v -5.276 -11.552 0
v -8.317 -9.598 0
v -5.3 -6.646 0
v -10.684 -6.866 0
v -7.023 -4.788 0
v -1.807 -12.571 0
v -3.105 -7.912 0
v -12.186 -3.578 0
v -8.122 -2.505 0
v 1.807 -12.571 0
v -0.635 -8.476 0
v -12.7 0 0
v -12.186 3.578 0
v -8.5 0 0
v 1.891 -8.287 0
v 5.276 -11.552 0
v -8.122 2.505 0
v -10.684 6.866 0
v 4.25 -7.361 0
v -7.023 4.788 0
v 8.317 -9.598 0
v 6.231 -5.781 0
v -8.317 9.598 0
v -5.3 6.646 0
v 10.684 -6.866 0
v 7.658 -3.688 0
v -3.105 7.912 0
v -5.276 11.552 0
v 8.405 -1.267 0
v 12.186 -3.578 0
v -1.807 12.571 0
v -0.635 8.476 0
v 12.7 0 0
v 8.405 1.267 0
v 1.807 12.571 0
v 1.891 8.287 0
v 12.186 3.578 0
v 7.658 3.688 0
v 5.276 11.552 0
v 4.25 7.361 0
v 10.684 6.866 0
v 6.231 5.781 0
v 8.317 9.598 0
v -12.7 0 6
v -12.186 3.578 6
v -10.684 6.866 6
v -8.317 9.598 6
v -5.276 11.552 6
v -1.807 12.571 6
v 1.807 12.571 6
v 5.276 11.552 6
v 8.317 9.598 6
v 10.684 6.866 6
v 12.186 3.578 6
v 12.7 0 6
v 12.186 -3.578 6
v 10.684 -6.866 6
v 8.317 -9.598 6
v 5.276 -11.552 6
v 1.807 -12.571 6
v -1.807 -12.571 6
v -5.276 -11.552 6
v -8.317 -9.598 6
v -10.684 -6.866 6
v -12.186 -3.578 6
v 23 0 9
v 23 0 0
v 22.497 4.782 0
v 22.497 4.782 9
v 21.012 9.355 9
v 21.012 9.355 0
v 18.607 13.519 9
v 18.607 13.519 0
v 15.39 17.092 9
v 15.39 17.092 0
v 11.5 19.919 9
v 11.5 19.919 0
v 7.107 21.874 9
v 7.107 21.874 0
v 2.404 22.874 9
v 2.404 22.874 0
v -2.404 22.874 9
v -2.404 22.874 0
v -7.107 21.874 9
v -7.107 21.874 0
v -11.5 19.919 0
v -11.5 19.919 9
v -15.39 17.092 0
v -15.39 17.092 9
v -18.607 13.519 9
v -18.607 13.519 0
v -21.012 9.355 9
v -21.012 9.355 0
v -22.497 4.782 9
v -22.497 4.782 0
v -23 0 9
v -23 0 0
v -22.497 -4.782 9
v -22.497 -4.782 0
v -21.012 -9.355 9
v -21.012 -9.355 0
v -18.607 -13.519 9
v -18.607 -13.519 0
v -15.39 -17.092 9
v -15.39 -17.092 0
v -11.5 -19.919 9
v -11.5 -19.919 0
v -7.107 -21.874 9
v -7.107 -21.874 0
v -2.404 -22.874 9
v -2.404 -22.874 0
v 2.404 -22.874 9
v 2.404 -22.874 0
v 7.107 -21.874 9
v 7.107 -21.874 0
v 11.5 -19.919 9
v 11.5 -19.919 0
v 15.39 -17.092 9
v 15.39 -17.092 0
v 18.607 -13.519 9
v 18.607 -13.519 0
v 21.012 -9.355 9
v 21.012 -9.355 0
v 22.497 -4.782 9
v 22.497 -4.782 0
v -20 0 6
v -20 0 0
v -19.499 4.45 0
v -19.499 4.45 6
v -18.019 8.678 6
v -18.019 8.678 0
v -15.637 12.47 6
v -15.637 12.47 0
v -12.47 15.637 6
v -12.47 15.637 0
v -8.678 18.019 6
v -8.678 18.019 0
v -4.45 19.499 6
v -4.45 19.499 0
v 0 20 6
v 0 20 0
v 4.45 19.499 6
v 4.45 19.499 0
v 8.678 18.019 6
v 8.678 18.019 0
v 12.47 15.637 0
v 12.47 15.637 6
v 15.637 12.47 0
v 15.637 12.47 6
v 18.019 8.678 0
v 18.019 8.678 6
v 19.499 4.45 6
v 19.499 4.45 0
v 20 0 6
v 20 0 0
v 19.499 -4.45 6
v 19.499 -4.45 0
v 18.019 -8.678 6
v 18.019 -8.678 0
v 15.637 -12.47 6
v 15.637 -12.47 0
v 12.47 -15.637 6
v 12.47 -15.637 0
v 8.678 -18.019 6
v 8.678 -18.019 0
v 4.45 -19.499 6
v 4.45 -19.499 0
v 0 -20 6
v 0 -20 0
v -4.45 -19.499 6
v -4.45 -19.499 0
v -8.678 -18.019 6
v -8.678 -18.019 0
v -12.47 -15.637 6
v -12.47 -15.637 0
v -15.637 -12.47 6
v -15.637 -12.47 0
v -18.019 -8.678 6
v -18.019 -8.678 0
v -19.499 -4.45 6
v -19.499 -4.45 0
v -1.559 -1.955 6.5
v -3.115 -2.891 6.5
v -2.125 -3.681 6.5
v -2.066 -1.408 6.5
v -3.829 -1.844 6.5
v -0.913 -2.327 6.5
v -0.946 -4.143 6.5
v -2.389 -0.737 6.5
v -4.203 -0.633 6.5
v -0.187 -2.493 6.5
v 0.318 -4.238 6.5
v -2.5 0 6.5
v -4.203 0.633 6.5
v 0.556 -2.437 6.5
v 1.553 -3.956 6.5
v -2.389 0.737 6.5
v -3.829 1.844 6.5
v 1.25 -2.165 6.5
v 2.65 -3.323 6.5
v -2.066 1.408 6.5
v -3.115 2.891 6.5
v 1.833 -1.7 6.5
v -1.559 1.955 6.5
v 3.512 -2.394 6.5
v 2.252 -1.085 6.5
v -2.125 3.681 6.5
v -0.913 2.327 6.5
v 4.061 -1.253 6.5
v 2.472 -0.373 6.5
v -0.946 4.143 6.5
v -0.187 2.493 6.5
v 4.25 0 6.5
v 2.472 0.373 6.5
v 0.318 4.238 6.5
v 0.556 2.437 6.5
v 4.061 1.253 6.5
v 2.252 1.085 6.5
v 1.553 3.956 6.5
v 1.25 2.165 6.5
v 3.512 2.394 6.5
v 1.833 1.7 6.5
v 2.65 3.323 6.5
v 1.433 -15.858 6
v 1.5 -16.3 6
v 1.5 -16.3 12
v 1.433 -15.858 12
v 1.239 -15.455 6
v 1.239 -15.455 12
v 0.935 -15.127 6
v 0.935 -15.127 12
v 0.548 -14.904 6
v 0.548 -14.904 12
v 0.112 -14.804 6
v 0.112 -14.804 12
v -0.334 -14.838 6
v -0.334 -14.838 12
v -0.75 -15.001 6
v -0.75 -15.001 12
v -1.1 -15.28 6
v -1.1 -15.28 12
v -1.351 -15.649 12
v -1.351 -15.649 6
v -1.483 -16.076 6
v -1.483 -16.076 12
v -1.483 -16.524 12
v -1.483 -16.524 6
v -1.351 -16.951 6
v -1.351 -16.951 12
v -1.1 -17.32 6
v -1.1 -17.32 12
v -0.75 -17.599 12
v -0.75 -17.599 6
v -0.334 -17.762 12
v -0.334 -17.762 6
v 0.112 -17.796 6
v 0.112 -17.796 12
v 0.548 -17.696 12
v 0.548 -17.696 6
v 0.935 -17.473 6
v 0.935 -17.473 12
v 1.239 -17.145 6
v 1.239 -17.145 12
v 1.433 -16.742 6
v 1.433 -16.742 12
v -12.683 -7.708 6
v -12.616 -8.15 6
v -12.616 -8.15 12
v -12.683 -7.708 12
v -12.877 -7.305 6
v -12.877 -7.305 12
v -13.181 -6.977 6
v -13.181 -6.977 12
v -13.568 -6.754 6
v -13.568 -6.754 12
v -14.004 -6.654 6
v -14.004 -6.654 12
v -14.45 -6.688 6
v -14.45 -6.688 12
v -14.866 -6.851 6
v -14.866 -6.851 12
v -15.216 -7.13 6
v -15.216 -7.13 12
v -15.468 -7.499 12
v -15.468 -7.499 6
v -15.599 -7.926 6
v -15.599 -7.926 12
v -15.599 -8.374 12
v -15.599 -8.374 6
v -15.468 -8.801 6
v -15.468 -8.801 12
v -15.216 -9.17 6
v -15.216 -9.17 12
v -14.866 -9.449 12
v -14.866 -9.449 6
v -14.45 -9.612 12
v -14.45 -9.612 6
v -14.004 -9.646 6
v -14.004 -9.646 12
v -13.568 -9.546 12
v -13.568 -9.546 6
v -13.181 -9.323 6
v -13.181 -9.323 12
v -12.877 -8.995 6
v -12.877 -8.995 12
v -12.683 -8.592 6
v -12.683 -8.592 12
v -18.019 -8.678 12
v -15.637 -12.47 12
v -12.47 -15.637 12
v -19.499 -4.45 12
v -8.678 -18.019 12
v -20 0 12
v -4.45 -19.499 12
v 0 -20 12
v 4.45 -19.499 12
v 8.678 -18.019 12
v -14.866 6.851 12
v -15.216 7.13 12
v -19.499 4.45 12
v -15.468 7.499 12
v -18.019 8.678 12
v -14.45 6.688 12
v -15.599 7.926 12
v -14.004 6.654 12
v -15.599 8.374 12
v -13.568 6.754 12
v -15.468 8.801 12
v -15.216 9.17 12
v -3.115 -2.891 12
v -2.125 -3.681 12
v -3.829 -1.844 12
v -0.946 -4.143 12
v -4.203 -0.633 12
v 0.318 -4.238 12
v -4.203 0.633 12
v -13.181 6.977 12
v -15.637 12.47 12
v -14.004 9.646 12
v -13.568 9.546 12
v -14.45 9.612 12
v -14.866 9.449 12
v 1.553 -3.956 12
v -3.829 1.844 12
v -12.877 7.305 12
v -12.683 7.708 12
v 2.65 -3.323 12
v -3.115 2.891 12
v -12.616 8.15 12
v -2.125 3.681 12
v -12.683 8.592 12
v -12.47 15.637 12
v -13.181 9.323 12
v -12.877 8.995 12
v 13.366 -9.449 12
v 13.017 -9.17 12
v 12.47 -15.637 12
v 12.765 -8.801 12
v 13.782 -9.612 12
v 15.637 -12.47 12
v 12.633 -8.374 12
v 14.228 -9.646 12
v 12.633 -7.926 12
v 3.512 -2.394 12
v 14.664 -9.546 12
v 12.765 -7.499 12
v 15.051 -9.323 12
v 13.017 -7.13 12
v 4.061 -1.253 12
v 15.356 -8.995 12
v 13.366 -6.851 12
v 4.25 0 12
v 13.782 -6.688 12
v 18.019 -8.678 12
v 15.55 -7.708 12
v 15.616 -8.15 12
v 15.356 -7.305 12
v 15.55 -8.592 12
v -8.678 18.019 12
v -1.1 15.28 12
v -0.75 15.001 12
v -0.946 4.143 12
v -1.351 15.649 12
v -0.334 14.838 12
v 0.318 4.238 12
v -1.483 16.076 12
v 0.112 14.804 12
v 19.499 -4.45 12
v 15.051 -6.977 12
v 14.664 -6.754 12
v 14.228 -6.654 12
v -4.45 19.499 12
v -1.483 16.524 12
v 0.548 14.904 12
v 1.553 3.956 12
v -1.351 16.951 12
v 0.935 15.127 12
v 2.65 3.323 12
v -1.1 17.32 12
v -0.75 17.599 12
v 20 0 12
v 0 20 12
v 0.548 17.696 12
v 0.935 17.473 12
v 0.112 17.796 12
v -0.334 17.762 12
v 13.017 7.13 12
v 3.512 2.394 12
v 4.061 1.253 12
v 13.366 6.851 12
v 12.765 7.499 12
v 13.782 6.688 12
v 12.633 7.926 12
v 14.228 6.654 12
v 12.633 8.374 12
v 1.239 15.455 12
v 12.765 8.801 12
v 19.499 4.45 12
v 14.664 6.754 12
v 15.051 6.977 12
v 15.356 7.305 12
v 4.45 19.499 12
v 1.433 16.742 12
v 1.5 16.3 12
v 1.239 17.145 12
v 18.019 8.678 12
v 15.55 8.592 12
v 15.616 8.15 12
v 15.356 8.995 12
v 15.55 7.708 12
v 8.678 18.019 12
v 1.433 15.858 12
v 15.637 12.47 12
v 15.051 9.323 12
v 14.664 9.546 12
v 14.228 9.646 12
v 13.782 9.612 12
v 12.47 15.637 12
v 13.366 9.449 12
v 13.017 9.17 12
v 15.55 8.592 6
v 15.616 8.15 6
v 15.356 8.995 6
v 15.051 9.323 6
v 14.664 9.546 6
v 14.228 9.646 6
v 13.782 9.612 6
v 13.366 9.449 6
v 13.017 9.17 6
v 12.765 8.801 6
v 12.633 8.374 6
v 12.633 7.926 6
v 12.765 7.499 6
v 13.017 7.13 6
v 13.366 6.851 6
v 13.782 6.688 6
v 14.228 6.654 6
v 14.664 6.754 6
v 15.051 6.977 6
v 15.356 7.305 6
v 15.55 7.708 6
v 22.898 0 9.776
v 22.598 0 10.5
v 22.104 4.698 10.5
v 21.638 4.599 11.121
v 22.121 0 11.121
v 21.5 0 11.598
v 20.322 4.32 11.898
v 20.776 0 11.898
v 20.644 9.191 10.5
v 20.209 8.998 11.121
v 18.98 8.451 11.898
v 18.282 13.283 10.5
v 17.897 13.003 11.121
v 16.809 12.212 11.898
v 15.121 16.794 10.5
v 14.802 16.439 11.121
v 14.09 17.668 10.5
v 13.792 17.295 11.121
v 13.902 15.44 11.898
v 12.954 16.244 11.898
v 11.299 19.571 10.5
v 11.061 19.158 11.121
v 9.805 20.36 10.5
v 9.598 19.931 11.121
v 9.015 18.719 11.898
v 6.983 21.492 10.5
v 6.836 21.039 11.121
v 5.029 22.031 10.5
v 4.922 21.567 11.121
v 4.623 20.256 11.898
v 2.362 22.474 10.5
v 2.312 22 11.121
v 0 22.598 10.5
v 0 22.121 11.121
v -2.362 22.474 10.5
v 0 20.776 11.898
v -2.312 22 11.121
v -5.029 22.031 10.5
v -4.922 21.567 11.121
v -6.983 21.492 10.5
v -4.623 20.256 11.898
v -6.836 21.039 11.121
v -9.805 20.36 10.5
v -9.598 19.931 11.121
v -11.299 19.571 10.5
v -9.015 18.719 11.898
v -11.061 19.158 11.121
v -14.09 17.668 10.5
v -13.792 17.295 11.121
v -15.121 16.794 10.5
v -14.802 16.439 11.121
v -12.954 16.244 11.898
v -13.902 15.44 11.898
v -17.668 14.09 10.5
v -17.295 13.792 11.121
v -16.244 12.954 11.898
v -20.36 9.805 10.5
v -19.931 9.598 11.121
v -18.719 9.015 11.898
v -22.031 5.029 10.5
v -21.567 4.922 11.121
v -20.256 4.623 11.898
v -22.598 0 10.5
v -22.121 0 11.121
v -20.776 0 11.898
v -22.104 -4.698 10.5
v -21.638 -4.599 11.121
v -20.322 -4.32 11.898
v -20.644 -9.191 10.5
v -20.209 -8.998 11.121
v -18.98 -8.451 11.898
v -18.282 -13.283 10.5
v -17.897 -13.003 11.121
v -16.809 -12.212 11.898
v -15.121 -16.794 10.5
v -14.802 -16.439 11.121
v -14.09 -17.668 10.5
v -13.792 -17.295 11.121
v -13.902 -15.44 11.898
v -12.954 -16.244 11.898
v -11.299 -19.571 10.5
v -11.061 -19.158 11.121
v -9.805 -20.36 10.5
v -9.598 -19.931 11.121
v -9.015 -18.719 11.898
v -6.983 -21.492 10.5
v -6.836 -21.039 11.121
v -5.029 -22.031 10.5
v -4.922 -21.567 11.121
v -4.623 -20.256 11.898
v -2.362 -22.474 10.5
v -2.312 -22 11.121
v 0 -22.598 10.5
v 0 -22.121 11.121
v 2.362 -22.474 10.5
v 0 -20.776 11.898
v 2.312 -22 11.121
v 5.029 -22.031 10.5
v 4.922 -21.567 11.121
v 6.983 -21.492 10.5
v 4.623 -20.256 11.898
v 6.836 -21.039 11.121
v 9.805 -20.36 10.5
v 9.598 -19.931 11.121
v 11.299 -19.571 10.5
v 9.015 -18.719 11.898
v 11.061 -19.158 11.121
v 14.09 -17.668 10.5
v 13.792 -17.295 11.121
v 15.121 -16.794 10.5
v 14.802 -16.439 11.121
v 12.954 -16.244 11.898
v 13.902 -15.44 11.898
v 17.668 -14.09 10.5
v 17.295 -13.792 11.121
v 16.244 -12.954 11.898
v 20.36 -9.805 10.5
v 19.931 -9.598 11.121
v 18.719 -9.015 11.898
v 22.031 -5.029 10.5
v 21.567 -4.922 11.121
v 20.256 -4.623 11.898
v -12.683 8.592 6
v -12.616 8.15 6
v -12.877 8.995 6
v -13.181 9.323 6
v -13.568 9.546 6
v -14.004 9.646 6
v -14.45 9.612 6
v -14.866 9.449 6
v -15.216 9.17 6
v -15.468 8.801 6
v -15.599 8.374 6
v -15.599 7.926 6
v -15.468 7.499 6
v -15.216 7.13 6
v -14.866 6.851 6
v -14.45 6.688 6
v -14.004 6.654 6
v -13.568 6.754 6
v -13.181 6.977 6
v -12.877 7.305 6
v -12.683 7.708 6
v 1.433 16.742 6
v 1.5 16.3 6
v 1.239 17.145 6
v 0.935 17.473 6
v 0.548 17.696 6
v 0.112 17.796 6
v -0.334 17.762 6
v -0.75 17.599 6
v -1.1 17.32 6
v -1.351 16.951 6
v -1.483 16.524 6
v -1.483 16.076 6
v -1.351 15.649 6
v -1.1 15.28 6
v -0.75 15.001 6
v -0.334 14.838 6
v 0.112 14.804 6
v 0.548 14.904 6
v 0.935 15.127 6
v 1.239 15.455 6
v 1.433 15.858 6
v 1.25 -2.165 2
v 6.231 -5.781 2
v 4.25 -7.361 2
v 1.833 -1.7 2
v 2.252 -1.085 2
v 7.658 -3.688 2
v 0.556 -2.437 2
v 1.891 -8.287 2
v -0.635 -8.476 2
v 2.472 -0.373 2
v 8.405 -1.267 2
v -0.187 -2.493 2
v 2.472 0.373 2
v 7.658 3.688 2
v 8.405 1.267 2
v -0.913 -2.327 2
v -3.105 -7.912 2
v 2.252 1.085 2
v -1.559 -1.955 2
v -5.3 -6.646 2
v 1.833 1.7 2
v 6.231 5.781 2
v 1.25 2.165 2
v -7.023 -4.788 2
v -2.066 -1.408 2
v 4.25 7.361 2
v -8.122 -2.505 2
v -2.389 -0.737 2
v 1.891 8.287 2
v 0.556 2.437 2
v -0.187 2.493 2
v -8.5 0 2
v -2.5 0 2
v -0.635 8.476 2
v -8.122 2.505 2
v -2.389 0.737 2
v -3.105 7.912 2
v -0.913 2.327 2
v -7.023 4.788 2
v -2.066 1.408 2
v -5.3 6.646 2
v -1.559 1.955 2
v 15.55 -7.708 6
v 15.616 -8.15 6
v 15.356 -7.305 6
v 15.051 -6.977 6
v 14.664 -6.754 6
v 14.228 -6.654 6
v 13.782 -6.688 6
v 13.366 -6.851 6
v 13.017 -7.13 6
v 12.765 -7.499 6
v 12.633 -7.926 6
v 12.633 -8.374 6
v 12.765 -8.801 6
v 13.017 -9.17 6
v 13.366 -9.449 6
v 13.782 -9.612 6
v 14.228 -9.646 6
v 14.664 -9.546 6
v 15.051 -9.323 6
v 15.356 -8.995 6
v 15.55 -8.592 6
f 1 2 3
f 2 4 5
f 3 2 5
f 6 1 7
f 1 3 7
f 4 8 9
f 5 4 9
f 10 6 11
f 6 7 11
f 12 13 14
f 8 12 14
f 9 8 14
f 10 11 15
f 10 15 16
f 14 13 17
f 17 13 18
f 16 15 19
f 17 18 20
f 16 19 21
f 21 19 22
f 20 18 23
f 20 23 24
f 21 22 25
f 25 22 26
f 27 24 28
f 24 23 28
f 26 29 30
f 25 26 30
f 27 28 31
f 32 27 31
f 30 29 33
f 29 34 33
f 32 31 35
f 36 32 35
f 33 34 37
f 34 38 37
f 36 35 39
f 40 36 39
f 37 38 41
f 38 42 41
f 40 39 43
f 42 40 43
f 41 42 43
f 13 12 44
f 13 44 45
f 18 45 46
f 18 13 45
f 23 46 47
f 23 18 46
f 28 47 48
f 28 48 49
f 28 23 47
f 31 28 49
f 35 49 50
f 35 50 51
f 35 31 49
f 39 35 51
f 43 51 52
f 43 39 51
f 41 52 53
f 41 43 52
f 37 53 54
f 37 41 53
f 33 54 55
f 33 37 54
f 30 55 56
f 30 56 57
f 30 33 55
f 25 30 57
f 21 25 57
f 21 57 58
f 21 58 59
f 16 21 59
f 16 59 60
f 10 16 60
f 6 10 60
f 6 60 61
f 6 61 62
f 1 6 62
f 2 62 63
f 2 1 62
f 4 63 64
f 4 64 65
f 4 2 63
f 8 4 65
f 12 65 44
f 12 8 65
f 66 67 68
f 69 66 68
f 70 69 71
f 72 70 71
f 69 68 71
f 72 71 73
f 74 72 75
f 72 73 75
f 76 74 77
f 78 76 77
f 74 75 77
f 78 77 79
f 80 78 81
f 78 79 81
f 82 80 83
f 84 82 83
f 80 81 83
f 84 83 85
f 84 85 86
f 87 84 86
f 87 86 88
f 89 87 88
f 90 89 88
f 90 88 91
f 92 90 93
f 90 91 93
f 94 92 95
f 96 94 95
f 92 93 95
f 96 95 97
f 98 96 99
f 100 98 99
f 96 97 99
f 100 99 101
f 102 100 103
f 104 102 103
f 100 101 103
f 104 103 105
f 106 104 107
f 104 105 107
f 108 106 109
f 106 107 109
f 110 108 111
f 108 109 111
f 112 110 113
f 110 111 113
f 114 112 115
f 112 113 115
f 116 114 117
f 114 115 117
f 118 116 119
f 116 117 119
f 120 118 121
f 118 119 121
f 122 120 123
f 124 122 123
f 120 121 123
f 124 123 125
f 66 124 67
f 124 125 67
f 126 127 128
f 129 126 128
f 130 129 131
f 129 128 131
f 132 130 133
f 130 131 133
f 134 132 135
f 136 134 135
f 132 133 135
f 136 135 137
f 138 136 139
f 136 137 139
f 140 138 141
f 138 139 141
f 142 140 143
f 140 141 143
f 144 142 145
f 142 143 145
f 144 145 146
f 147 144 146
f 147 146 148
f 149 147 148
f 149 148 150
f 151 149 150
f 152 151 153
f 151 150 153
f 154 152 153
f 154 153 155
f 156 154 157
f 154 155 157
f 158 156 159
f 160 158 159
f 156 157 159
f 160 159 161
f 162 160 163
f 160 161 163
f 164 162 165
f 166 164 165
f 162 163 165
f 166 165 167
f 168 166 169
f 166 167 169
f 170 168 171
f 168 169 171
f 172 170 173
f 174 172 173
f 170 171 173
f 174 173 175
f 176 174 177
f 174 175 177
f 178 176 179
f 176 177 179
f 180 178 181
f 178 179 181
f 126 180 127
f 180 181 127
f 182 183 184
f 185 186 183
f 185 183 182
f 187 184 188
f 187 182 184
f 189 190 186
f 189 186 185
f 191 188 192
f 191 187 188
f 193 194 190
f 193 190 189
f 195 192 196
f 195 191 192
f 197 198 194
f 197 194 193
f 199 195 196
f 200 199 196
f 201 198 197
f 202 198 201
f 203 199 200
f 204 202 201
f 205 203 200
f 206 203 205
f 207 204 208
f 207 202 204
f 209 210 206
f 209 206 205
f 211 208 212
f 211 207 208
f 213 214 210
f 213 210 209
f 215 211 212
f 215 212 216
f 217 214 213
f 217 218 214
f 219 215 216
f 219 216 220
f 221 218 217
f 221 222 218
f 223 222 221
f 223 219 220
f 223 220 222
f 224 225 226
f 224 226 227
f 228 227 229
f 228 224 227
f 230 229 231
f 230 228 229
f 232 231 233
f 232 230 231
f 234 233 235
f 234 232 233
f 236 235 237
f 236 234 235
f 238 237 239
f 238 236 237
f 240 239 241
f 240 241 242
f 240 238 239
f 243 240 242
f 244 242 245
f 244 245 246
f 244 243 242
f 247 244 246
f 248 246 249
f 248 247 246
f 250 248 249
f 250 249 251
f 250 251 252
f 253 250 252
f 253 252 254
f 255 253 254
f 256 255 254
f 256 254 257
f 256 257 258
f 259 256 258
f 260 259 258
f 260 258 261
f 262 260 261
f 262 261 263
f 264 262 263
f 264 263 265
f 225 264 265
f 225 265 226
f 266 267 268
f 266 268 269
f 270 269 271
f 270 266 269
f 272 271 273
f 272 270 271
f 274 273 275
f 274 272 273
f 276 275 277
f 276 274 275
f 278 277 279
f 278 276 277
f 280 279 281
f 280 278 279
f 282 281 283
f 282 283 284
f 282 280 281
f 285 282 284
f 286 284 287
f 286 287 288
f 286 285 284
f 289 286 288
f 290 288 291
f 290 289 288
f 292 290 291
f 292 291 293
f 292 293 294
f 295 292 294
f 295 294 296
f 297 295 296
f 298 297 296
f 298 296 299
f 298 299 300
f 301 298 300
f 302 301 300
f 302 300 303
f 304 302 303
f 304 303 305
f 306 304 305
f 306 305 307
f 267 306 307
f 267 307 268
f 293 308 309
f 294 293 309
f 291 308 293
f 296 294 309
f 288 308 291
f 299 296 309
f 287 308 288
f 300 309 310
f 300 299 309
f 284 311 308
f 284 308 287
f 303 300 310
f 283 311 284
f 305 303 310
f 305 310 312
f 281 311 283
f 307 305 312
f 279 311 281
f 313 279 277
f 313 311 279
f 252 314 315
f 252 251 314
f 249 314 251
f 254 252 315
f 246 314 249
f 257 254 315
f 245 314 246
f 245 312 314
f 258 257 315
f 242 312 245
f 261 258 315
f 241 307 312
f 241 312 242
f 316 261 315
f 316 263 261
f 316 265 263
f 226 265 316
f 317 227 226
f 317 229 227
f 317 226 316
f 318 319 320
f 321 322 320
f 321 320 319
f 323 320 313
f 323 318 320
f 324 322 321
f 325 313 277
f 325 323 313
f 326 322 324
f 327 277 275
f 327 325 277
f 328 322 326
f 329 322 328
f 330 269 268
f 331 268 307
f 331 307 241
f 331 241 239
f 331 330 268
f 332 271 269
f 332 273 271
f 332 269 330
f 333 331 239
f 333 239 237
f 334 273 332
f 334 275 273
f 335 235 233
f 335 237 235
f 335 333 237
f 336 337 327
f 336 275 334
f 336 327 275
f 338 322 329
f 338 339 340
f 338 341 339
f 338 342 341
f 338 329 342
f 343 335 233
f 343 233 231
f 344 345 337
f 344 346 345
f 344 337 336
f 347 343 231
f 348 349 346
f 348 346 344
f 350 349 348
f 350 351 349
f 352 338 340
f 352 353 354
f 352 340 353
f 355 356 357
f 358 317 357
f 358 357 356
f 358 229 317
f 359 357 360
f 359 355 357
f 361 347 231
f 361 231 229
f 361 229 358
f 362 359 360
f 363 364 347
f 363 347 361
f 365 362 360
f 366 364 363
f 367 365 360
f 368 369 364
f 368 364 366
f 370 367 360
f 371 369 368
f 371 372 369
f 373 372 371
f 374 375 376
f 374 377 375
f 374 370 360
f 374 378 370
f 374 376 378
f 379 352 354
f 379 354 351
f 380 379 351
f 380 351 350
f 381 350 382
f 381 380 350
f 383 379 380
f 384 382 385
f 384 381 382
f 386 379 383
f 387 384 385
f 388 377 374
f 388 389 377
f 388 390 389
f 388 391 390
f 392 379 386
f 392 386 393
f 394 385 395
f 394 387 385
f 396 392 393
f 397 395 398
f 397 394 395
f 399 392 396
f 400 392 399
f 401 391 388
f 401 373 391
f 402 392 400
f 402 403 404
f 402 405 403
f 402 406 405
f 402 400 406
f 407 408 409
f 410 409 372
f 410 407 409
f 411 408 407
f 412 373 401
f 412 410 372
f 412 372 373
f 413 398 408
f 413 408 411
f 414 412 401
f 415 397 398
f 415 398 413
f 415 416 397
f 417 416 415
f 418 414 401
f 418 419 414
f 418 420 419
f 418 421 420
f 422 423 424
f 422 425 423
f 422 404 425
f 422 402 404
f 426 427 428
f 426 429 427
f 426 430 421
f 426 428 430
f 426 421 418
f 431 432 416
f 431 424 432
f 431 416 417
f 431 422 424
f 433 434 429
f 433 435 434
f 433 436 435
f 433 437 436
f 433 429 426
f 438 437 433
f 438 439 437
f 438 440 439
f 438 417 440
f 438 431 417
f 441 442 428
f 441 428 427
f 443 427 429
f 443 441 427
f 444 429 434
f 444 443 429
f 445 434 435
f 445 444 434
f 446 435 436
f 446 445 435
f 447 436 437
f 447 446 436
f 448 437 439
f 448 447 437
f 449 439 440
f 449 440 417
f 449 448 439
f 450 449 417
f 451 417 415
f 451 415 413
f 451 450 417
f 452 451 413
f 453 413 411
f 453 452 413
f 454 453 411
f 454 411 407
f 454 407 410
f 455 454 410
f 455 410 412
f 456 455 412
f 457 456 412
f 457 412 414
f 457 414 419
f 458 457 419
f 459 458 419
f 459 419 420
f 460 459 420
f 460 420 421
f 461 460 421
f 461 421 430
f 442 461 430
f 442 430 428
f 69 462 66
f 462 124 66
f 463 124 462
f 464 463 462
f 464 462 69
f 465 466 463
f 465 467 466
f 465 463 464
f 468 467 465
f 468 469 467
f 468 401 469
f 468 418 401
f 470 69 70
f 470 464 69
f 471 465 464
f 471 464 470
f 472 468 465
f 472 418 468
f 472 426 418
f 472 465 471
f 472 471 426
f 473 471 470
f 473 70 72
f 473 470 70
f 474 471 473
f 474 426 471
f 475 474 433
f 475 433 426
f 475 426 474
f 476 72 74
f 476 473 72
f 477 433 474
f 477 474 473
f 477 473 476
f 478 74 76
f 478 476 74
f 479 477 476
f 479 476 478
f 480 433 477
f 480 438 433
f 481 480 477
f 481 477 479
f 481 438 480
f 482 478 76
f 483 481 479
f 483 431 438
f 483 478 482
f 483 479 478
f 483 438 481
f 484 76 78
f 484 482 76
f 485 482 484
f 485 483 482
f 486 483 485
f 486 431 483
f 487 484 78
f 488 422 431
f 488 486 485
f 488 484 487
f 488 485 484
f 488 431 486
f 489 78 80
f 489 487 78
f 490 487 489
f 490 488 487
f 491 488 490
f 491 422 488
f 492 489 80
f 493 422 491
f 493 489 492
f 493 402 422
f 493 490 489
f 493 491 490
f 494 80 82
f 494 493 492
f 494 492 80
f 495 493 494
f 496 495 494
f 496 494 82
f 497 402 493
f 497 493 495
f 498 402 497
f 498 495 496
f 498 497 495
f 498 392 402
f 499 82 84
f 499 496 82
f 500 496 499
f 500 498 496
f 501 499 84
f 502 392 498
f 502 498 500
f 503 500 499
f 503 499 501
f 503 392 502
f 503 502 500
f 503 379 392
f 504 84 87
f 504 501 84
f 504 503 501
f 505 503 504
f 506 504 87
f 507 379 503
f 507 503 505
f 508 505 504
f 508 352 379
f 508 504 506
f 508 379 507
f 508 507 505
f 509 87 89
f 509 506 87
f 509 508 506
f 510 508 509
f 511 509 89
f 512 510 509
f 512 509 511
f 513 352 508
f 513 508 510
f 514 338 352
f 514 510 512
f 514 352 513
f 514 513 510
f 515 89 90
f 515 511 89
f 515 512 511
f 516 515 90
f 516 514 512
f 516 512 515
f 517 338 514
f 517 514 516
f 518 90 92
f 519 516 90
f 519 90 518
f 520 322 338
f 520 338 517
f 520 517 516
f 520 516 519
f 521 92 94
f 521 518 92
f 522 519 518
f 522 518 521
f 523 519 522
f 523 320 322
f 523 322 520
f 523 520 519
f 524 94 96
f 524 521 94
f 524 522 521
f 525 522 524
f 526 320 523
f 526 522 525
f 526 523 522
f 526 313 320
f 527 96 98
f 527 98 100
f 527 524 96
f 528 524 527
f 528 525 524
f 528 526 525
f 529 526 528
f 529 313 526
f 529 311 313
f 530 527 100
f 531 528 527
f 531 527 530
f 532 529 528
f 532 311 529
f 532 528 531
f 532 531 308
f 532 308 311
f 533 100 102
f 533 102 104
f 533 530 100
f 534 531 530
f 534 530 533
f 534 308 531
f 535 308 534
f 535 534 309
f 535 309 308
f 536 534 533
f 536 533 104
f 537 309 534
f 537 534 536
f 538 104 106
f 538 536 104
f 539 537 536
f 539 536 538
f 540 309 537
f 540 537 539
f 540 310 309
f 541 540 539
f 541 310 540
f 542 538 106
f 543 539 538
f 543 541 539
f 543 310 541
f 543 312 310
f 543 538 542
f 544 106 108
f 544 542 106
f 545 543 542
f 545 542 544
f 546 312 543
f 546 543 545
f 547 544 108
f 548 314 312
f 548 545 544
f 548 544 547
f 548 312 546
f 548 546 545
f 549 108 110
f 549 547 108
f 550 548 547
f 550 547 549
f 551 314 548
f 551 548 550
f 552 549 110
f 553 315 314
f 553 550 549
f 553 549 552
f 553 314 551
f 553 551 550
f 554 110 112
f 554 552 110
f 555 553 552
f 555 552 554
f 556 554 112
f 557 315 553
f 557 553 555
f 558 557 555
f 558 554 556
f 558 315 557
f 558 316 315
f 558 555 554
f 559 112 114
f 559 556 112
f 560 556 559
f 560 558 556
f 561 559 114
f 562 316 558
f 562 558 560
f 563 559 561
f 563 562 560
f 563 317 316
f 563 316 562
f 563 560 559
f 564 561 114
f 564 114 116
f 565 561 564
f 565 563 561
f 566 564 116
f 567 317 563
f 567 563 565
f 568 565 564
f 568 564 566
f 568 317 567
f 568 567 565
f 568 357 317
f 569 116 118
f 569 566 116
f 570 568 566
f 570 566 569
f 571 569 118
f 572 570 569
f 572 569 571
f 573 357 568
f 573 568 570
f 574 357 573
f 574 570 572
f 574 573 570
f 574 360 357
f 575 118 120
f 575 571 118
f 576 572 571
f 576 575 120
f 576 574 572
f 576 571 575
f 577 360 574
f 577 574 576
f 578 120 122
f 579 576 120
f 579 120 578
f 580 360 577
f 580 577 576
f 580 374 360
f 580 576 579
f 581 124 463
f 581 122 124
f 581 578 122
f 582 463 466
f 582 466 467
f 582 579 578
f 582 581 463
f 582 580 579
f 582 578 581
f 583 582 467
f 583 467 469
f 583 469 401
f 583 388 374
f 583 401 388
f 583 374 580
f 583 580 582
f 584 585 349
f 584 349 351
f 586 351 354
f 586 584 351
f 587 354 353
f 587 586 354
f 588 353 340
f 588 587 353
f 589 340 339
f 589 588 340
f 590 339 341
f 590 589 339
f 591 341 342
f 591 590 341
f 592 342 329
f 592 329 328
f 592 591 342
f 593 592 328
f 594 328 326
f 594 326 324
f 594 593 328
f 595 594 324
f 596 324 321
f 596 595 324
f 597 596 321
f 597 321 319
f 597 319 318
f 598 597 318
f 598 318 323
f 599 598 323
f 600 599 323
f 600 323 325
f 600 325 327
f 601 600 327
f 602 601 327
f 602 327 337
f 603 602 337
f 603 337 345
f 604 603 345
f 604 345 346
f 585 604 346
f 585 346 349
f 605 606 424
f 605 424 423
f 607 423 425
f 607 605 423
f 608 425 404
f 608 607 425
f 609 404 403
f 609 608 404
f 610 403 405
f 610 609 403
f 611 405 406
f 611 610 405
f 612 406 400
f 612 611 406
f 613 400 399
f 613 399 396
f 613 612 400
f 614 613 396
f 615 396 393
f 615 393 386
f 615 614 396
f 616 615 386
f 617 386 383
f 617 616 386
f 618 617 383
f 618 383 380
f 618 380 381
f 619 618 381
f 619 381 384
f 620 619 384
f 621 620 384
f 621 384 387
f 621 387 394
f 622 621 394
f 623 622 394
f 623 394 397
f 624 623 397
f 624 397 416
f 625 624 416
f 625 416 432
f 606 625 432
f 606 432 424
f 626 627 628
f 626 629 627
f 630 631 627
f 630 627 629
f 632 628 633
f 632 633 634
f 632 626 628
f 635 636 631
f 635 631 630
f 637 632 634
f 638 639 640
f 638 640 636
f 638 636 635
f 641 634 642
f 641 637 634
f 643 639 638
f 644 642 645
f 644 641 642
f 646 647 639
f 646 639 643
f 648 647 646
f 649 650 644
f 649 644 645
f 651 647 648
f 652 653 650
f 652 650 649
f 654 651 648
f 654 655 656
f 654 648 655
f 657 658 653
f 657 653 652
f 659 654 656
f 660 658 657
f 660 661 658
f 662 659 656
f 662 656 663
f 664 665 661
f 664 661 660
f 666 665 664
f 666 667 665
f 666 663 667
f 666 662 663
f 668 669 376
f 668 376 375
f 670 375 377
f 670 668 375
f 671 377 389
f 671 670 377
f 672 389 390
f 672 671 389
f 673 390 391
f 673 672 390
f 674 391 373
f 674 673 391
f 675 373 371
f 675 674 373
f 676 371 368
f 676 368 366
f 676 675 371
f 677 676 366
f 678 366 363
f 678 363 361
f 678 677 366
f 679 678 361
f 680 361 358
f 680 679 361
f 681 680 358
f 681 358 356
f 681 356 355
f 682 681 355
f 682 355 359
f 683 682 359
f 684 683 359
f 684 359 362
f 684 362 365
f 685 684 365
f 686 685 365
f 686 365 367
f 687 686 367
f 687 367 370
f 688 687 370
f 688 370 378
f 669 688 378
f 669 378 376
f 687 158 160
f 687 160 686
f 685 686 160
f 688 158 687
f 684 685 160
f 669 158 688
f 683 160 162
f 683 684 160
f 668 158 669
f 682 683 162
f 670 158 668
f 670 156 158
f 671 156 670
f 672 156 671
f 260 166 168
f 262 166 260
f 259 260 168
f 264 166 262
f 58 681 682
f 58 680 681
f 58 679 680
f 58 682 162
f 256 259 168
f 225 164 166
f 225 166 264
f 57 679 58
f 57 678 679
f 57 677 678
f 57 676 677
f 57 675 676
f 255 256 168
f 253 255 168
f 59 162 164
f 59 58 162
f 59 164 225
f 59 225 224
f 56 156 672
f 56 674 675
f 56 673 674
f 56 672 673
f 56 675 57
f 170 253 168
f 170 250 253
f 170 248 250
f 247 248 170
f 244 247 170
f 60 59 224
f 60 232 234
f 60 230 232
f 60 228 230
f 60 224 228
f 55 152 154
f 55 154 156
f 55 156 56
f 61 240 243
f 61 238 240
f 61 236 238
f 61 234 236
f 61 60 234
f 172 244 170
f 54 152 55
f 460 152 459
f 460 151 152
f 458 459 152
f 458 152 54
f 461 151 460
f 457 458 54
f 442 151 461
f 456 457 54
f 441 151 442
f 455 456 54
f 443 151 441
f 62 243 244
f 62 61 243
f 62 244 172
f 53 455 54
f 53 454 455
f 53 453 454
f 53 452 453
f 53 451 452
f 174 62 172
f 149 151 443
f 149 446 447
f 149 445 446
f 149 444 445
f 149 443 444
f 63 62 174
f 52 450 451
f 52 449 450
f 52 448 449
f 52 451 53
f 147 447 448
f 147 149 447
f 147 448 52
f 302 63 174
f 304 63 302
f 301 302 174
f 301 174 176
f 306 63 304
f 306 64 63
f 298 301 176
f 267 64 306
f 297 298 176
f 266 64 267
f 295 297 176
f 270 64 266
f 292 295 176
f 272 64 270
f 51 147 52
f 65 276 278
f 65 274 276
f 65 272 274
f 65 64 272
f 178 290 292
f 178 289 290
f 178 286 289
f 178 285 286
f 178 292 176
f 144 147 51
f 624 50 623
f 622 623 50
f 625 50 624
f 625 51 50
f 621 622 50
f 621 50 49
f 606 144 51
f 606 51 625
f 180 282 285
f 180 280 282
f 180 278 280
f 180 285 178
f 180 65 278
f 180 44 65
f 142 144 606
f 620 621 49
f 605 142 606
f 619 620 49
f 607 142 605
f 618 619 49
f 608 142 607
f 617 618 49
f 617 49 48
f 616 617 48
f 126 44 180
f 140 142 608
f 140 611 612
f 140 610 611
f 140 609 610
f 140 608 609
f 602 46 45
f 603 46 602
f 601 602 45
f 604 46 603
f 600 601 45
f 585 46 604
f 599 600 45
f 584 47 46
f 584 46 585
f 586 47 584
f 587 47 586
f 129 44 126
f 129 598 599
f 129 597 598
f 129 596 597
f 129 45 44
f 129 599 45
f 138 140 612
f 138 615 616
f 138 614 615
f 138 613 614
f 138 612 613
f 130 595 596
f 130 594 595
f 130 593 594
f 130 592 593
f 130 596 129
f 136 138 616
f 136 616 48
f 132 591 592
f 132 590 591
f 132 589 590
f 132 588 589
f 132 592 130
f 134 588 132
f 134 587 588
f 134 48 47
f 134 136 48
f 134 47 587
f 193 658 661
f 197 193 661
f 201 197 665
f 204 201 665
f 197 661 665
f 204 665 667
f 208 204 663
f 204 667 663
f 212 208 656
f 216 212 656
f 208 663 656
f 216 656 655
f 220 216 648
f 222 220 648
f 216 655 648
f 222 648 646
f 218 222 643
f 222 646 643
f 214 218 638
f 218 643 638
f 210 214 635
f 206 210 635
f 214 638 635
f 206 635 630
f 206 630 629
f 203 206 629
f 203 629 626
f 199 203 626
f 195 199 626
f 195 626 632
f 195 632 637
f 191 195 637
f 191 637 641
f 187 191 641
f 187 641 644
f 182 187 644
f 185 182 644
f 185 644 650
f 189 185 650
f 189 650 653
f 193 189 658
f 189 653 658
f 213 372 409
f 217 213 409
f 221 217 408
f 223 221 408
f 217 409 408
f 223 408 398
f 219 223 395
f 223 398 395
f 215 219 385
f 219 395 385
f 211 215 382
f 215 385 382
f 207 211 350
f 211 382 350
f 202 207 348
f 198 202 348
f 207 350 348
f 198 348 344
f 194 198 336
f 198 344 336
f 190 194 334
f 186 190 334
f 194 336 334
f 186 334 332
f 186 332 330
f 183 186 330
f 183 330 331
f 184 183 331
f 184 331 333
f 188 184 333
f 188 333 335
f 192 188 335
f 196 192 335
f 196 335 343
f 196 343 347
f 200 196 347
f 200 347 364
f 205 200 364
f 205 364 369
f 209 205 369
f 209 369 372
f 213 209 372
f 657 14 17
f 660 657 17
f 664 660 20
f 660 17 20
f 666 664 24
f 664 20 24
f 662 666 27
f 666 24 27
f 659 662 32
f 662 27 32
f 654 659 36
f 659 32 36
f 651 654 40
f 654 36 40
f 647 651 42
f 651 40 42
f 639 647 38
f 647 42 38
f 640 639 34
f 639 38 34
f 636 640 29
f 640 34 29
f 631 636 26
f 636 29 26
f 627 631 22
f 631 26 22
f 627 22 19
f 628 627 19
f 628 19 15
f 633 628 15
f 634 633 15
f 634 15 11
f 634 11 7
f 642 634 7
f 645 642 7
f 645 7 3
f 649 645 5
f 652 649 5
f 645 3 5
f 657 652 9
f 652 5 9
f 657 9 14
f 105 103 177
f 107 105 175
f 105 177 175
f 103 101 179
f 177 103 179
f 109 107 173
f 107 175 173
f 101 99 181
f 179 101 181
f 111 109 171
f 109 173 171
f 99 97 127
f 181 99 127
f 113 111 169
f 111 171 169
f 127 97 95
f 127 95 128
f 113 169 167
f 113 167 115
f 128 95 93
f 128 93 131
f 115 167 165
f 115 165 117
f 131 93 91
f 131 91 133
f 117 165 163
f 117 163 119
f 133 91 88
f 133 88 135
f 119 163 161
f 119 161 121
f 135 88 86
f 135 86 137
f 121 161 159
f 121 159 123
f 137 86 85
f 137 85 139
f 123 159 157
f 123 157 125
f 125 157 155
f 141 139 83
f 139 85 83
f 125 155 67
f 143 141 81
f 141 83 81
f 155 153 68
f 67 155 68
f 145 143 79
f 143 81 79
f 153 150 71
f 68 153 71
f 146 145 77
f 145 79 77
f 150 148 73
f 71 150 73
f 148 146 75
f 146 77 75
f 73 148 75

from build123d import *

# Parameters (mm, degrees)
SKETCH1_R                               = 23
SKETCH1_R_2                             = 1.5
BOSS_EXTRUDE1_DEPTH                     = 12
SKETCH2_R                               = 20
SKETCH2_R_2                             = 12.7
CUT_EXTRUDE1_DEPTH                      = 6
FILLET1_R                               = 3
CBORE_FOR_M5_HEX_HEAD_BOLT1_D           = 5
CBORE_FOR_M5_HEX_HEAD_BOLT1_CBORE_D     = 8.5
CBORE_FOR_M5_HEX_HEAD_BOLT1_CBORE_DEPTH = 5.5
SKETCH5_R                               = 8.5
CUT_EXTRUDE2_DEPTH                      = 2


with BuildPart() as part:
    # Sketch1 → Boss-Extrude1 (new body)
    with BuildSketch(Plane.XY):
        Circle(SKETCH1_R)
        with Locations((0, 16.3)):
            Circle(SKETCH1_R_2, mode=Mode.SUBTRACT)
        with Locations((14.116214082, 8.15)):
            Circle(SKETCH1_R_2, mode=Mode.SUBTRACT)
        with Locations((14.116214082, -8.15)):
            Circle(SKETCH1_R_2, mode=Mode.SUBTRACT)
        with Locations((0, -16.3)):
            Circle(SKETCH1_R_2, mode=Mode.SUBTRACT)
        with Locations((-14.116214082, -8.15)):
            Circle(SKETCH1_R_2, mode=Mode.SUBTRACT)
        with Locations((-14.116214082, 8.15)):
            Circle(SKETCH1_R_2, mode=Mode.SUBTRACT)
    extrude(amount=BOSS_EXTRUDE1_DEPTH)

    # Sketch2 → Cut-Extrude1 (cut)
    with BuildSketch(Plane(origin=(0, 0, 0), x_dir=(-1, 0, 0), z_dir=(0, 0, -1))):
        Circle(SKETCH2_R)
        Circle(SKETCH2_R_2, mode=Mode.SUBTRACT)
    extrude(amount=-CUT_EXTRUDE1_DEPTH, mode=Mode.SUBTRACT)

    # Fillet1
    fillet1_edges = [part.edges().sort_by_distance(p)[0] for p in [
        (-23, 0, 12),
    ]]
    fillet(fillet1_edges, radius=FILLET1_R)

    # CBORE for M5 Hex Head Bolt1 (through all)
    with Locations(Plane.XY.offset(12)):
        with Locations((0, 0)):
            CounterBoreHole(CBORE_FOR_M5_HEX_HEAD_BOLT1_D / 2, CBORE_FOR_M5_HEX_HEAD_BOLT1_CBORE_D / 2, CBORE_FOR_M5_HEX_HEAD_BOLT1_CBORE_DEPTH)

    # Sketch5 → Cut-Extrude2 (cut)
    with BuildSketch(Plane(origin=(0, 0, 0), x_dir=(-1, 0, 0), z_dir=(0, 0, -1))):
        Circle(SKETCH5_R)
    extrude(amount=-CUT_EXTRUDE2_DEPTH, mode=Mode.SUBTRACT)


solid = part.part
